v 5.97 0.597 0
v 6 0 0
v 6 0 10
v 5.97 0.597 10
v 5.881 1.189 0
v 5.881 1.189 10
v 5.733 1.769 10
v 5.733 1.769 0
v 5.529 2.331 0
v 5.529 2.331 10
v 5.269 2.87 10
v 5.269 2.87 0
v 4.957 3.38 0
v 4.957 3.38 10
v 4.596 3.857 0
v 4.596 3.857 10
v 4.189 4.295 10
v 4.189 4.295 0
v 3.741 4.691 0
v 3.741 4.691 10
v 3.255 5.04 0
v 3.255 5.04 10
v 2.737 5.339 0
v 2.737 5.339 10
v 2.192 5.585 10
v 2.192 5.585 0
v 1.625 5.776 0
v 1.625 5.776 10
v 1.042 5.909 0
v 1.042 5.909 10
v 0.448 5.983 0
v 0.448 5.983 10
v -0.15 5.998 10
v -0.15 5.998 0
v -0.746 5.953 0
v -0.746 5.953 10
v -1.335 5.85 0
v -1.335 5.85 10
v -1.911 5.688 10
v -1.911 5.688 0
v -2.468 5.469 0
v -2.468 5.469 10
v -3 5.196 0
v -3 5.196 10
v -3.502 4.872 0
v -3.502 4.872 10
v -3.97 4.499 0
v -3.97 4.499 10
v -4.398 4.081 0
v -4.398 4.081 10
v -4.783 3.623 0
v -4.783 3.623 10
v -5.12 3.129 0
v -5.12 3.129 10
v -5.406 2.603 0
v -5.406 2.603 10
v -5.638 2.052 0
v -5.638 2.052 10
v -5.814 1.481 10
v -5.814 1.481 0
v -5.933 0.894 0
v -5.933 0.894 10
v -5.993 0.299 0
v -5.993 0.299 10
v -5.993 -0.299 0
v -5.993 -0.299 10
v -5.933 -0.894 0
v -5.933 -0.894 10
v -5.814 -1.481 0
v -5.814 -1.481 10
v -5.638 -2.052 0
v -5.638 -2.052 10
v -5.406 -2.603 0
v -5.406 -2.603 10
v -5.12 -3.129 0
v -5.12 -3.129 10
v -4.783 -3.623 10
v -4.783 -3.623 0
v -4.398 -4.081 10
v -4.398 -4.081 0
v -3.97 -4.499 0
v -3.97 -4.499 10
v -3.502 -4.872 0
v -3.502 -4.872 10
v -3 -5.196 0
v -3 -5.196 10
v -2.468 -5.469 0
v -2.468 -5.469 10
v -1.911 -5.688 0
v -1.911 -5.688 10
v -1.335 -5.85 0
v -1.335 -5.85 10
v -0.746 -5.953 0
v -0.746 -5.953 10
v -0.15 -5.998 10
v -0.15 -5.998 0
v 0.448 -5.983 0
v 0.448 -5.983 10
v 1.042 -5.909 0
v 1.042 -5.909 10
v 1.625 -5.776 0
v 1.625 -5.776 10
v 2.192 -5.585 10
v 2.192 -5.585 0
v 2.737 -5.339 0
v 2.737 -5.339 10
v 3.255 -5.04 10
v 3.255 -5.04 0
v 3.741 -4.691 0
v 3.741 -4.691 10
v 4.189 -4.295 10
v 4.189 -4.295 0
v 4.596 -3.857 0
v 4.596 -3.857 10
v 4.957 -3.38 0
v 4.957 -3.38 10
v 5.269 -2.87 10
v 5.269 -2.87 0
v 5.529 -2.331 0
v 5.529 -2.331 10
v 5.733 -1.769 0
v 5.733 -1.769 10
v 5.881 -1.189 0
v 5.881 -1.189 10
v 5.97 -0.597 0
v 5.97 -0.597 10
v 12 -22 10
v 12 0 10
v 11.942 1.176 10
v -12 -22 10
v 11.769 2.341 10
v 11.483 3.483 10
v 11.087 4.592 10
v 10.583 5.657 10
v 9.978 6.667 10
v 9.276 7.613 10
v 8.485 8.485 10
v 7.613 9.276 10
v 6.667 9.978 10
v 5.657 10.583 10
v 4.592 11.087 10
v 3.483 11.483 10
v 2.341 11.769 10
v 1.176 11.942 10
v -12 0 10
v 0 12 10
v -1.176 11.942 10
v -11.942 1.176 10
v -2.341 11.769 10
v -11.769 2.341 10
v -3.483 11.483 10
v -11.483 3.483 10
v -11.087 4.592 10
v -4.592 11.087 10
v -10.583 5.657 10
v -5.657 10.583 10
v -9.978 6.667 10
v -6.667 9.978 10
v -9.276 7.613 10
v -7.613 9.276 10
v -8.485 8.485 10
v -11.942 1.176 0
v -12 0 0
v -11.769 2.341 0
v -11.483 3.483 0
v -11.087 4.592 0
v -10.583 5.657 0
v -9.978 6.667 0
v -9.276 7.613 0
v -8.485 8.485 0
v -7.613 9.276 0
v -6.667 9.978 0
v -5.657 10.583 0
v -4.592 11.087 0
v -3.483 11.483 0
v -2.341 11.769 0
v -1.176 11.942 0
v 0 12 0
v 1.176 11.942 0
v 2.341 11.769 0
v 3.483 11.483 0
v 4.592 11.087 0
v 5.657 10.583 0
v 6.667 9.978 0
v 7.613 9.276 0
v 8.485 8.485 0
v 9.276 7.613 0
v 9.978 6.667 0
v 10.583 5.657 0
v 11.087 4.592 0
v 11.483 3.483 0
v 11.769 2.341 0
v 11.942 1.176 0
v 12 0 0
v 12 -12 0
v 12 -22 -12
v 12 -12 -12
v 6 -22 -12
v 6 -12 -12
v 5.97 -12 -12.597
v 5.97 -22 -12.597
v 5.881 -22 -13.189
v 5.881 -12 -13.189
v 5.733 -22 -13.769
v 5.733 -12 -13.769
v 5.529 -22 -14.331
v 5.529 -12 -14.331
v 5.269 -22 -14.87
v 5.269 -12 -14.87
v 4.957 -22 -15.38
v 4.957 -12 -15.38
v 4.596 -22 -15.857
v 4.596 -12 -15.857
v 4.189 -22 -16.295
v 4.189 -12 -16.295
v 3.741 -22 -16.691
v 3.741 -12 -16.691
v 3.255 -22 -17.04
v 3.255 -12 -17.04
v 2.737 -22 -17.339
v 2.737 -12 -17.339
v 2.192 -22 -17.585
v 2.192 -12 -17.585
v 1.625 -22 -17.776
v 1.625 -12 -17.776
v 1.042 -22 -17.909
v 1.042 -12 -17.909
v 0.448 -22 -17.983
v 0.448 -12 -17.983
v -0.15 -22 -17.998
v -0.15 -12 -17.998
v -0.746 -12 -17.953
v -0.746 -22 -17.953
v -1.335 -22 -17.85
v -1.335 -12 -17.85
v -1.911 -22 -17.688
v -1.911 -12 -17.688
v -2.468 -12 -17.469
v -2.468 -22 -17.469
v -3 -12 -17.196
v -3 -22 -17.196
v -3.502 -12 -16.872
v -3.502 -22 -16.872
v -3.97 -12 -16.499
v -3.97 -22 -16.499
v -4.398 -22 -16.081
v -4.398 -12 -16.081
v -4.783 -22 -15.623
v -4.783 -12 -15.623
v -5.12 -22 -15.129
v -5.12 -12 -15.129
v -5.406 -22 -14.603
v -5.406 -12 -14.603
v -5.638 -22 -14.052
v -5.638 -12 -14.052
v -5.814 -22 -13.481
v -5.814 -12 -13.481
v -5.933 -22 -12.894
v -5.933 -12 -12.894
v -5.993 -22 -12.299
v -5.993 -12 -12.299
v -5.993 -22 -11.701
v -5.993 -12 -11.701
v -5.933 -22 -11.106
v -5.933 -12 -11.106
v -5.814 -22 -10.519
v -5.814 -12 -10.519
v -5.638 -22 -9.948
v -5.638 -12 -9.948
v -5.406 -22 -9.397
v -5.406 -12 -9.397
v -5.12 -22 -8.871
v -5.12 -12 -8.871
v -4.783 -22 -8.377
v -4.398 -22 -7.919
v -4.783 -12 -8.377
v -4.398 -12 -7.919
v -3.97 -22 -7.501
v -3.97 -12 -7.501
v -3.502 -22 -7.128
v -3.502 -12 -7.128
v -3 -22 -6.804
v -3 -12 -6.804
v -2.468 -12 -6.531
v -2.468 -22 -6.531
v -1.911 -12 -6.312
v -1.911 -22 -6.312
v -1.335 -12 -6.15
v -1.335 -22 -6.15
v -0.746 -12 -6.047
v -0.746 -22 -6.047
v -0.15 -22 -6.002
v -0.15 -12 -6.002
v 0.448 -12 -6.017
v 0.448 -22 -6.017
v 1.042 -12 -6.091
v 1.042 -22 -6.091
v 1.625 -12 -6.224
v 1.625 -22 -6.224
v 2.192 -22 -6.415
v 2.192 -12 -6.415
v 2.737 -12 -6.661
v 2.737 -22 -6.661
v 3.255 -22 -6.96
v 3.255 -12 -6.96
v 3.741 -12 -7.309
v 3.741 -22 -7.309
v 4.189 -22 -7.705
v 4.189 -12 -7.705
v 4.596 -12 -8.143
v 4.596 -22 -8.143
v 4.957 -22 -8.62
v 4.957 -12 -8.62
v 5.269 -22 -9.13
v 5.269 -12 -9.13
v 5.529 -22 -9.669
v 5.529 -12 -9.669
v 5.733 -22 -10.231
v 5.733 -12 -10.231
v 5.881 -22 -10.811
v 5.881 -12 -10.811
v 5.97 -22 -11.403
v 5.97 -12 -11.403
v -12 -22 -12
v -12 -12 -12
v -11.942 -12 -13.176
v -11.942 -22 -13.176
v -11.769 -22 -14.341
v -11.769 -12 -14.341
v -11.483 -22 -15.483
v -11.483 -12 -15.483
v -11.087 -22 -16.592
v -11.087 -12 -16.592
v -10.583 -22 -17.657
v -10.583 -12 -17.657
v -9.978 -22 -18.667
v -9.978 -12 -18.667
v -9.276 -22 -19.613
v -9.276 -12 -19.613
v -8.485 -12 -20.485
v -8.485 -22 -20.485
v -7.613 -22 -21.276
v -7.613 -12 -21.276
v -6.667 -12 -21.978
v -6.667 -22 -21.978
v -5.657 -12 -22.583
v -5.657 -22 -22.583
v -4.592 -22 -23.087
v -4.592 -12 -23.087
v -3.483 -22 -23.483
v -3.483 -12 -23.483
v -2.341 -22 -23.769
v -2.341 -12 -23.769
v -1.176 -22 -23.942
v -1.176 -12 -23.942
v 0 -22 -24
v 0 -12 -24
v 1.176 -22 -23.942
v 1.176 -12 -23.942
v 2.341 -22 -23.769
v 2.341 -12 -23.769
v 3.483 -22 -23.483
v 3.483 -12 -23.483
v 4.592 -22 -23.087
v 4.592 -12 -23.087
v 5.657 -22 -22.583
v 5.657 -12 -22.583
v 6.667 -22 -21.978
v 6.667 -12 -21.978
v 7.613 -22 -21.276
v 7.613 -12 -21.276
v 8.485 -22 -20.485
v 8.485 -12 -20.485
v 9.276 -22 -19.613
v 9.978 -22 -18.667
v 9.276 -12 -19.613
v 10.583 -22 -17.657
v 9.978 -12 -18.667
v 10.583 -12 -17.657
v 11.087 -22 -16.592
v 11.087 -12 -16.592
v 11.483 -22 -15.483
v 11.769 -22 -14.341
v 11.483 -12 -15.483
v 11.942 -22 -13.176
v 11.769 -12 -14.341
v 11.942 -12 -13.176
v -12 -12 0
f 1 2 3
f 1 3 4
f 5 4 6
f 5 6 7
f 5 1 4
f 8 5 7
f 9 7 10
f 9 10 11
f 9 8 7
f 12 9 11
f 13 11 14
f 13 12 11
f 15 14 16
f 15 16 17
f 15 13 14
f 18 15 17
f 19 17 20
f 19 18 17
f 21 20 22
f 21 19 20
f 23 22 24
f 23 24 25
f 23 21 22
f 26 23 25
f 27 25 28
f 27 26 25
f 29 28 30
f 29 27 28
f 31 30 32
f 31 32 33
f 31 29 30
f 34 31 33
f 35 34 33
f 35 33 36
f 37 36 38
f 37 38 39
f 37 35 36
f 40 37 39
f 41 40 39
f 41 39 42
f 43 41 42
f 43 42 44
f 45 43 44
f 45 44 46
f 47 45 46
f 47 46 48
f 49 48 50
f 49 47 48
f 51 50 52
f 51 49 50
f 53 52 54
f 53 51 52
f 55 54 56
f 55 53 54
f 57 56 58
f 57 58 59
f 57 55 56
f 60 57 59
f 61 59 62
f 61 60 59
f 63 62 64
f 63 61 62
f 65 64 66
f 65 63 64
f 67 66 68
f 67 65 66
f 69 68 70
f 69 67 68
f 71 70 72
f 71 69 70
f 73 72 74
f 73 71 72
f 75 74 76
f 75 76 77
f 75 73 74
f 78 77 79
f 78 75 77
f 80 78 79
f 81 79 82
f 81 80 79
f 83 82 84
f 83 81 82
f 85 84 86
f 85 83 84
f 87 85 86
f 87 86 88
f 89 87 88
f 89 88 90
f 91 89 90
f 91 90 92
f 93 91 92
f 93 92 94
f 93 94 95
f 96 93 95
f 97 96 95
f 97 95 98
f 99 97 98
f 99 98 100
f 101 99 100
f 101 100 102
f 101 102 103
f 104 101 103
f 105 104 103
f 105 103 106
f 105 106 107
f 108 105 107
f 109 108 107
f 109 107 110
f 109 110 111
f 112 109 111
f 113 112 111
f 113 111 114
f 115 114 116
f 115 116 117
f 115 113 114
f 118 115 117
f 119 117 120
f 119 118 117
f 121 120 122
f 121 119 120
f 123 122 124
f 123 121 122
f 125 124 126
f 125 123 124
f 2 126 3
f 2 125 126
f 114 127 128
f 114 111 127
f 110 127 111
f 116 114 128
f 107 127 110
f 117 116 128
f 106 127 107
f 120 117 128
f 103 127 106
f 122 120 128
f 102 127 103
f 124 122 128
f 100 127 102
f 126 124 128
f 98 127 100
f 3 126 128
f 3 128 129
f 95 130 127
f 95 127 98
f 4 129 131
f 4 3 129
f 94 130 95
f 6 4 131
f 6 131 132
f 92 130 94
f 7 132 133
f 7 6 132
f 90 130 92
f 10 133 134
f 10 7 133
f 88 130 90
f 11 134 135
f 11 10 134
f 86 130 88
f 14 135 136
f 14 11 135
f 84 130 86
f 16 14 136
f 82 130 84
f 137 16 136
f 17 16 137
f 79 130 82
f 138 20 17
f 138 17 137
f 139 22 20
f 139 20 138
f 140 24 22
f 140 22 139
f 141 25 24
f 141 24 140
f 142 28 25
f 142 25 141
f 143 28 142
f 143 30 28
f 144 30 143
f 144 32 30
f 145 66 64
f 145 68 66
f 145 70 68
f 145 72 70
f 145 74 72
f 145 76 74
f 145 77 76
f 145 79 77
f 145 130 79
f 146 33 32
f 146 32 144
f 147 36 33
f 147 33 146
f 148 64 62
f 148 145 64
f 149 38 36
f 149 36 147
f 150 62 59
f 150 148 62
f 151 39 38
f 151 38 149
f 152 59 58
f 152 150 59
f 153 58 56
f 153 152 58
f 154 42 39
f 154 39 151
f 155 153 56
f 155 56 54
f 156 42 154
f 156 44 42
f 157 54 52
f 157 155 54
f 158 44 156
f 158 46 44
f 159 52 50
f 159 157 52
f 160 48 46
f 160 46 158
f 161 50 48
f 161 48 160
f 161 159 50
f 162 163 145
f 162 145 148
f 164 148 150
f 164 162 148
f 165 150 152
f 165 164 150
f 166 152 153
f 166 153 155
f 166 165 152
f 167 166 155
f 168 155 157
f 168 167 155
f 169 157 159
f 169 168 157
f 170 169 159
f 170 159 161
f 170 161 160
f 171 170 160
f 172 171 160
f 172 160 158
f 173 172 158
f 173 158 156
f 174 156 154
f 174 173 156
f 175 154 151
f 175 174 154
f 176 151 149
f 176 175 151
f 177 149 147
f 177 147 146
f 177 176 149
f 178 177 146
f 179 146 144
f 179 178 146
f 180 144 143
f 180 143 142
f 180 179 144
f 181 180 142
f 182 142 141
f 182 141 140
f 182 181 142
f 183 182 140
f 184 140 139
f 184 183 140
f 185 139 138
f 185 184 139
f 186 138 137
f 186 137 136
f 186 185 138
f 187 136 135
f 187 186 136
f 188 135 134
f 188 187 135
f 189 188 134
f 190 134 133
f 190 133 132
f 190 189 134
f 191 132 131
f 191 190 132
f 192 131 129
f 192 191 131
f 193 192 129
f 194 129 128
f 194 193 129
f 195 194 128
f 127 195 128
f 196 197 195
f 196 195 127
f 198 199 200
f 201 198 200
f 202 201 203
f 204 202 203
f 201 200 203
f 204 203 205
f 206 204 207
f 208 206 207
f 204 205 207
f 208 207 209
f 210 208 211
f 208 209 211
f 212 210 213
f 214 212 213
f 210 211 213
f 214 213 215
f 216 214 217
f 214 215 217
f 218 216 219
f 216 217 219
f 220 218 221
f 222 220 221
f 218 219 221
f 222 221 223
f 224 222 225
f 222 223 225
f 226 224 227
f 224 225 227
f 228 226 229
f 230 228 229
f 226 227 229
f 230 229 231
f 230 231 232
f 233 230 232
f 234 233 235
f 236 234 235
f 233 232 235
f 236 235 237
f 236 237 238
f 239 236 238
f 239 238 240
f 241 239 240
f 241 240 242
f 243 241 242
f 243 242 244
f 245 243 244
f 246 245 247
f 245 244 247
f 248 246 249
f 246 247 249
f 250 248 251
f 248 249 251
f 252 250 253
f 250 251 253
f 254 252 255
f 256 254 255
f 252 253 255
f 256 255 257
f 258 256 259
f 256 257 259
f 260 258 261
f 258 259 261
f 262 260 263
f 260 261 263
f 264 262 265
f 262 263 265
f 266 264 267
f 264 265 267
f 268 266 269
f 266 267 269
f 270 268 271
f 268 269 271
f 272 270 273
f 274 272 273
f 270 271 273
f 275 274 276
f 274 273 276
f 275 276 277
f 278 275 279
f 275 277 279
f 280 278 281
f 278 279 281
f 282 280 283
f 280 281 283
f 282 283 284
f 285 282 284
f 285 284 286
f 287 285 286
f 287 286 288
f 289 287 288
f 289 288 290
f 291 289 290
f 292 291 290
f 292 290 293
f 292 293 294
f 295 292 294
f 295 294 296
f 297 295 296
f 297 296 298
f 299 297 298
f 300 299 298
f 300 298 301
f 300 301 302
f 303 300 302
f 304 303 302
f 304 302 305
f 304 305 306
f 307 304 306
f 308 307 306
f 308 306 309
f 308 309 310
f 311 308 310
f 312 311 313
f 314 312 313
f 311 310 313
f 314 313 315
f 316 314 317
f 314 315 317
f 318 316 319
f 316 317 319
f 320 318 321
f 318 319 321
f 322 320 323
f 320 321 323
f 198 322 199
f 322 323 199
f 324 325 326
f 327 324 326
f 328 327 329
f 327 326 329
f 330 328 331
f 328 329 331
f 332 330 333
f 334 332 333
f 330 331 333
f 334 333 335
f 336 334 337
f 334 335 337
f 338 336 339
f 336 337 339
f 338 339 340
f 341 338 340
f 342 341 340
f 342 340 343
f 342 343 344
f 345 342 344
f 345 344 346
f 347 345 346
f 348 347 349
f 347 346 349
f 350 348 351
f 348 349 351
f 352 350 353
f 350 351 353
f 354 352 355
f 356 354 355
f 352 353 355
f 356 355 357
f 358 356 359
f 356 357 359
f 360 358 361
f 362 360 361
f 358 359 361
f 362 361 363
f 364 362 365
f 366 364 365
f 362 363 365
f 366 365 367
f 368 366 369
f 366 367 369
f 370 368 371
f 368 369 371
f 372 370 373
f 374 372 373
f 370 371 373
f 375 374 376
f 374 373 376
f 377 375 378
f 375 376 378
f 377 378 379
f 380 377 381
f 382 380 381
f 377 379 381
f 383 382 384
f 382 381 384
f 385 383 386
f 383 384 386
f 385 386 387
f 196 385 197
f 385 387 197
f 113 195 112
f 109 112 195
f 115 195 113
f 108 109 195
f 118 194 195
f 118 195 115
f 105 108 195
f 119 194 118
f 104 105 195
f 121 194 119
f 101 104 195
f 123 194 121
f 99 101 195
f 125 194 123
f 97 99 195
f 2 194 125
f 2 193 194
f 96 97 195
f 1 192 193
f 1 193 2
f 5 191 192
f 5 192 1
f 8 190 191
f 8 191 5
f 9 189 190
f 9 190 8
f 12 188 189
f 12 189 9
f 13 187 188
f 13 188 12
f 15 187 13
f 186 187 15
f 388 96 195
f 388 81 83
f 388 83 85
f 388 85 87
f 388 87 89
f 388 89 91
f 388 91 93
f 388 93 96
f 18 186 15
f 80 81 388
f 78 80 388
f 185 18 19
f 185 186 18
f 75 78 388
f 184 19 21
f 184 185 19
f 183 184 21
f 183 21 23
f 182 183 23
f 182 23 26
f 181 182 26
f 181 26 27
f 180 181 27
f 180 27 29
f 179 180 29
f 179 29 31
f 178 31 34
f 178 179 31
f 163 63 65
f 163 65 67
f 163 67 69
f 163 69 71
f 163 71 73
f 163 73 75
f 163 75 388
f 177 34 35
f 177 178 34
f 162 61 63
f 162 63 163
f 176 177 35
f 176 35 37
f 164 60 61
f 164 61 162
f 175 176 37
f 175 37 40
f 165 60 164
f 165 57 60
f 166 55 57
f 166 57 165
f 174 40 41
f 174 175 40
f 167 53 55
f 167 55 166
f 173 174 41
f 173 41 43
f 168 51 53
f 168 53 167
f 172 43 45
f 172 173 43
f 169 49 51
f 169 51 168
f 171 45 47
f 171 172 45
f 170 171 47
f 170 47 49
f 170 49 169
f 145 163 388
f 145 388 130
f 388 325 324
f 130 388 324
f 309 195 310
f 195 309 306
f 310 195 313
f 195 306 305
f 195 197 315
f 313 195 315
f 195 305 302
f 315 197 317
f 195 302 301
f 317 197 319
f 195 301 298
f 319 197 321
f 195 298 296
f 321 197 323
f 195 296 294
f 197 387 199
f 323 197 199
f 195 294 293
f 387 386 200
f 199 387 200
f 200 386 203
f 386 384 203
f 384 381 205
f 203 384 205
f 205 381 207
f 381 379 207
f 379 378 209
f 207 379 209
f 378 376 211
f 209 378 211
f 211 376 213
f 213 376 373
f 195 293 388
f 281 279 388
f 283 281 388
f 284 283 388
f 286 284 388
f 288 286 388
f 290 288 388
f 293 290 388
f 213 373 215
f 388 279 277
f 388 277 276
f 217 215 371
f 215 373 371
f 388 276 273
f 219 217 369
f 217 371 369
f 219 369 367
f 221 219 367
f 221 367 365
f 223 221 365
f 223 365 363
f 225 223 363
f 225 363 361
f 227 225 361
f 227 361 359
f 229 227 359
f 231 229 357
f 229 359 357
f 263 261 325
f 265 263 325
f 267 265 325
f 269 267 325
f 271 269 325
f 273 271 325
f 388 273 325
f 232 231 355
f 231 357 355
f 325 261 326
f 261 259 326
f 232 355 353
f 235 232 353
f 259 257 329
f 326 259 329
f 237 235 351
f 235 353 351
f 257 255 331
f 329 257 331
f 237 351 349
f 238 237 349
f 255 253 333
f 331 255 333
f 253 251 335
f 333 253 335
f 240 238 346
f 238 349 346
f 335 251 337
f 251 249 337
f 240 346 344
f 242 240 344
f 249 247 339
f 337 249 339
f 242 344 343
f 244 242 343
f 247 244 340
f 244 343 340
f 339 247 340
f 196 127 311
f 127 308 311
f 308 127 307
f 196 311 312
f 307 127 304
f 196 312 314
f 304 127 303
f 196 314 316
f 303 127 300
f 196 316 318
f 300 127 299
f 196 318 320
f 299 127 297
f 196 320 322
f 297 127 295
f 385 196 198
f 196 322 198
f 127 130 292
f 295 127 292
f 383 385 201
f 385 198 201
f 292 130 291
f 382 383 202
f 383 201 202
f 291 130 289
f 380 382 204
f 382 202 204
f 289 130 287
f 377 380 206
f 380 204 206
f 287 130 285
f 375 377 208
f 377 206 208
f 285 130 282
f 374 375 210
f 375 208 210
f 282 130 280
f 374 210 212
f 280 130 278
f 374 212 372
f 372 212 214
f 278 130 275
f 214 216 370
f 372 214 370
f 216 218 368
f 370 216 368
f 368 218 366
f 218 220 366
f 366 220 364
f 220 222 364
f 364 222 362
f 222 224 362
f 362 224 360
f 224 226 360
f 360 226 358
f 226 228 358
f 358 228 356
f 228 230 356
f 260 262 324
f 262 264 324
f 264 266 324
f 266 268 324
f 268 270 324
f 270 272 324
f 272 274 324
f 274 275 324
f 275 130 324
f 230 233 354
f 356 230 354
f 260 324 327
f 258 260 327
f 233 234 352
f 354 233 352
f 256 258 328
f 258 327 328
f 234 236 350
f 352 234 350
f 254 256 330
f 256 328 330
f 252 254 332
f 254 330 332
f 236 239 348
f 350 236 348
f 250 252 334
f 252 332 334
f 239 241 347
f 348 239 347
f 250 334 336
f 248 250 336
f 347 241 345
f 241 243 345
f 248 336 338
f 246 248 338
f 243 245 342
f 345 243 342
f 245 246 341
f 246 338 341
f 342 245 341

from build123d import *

# Parameters (mm, degrees)
SKETCH1_R           = 6
BOSS_EXTRUDE1_DEPTH = 10
BOSS_EXTRUDE2_DEPTH = 24


with BuildPart() as part:
    # Sketch1 → Boss-Extrude1 (new body)
    with BuildSketch(Plane.XY):
        with BuildLine():
            Line((12, 0), (12, -12))
            Line((12, -12), (-12, -12))
            Line((-12, -12), (-12, 0))
            ThreePointArc((-12, 0), (0, 12), (12, 0))
        make_face()
        Circle(SKETCH1_R, mode=Mode.SUBTRACT)
    extrude(amount=BOSS_EXTRUDE1_DEPTH)

    # Sketch3 → Boss-Extrude2 (add)
    with BuildSketch(Plane.ZY.offset(12)):
        Polygon((0, -12), (10, -22), (10, -12), align=None)
    extrude(amount=-BOSS_EXTRUDE2_DEPTH)

    # Mirror6: part across plane


with BuildPart() as part_1:
    add(part.part)
    add(part.part.mirror(Plane(origin=(26.142135624, -12, 0), x_dir=(0, -0.7071067811865439, 0.7071067811865512), z_dir=(0, -0.7071067811865513, -0.7071067811865438))))


solid = part_1.part
